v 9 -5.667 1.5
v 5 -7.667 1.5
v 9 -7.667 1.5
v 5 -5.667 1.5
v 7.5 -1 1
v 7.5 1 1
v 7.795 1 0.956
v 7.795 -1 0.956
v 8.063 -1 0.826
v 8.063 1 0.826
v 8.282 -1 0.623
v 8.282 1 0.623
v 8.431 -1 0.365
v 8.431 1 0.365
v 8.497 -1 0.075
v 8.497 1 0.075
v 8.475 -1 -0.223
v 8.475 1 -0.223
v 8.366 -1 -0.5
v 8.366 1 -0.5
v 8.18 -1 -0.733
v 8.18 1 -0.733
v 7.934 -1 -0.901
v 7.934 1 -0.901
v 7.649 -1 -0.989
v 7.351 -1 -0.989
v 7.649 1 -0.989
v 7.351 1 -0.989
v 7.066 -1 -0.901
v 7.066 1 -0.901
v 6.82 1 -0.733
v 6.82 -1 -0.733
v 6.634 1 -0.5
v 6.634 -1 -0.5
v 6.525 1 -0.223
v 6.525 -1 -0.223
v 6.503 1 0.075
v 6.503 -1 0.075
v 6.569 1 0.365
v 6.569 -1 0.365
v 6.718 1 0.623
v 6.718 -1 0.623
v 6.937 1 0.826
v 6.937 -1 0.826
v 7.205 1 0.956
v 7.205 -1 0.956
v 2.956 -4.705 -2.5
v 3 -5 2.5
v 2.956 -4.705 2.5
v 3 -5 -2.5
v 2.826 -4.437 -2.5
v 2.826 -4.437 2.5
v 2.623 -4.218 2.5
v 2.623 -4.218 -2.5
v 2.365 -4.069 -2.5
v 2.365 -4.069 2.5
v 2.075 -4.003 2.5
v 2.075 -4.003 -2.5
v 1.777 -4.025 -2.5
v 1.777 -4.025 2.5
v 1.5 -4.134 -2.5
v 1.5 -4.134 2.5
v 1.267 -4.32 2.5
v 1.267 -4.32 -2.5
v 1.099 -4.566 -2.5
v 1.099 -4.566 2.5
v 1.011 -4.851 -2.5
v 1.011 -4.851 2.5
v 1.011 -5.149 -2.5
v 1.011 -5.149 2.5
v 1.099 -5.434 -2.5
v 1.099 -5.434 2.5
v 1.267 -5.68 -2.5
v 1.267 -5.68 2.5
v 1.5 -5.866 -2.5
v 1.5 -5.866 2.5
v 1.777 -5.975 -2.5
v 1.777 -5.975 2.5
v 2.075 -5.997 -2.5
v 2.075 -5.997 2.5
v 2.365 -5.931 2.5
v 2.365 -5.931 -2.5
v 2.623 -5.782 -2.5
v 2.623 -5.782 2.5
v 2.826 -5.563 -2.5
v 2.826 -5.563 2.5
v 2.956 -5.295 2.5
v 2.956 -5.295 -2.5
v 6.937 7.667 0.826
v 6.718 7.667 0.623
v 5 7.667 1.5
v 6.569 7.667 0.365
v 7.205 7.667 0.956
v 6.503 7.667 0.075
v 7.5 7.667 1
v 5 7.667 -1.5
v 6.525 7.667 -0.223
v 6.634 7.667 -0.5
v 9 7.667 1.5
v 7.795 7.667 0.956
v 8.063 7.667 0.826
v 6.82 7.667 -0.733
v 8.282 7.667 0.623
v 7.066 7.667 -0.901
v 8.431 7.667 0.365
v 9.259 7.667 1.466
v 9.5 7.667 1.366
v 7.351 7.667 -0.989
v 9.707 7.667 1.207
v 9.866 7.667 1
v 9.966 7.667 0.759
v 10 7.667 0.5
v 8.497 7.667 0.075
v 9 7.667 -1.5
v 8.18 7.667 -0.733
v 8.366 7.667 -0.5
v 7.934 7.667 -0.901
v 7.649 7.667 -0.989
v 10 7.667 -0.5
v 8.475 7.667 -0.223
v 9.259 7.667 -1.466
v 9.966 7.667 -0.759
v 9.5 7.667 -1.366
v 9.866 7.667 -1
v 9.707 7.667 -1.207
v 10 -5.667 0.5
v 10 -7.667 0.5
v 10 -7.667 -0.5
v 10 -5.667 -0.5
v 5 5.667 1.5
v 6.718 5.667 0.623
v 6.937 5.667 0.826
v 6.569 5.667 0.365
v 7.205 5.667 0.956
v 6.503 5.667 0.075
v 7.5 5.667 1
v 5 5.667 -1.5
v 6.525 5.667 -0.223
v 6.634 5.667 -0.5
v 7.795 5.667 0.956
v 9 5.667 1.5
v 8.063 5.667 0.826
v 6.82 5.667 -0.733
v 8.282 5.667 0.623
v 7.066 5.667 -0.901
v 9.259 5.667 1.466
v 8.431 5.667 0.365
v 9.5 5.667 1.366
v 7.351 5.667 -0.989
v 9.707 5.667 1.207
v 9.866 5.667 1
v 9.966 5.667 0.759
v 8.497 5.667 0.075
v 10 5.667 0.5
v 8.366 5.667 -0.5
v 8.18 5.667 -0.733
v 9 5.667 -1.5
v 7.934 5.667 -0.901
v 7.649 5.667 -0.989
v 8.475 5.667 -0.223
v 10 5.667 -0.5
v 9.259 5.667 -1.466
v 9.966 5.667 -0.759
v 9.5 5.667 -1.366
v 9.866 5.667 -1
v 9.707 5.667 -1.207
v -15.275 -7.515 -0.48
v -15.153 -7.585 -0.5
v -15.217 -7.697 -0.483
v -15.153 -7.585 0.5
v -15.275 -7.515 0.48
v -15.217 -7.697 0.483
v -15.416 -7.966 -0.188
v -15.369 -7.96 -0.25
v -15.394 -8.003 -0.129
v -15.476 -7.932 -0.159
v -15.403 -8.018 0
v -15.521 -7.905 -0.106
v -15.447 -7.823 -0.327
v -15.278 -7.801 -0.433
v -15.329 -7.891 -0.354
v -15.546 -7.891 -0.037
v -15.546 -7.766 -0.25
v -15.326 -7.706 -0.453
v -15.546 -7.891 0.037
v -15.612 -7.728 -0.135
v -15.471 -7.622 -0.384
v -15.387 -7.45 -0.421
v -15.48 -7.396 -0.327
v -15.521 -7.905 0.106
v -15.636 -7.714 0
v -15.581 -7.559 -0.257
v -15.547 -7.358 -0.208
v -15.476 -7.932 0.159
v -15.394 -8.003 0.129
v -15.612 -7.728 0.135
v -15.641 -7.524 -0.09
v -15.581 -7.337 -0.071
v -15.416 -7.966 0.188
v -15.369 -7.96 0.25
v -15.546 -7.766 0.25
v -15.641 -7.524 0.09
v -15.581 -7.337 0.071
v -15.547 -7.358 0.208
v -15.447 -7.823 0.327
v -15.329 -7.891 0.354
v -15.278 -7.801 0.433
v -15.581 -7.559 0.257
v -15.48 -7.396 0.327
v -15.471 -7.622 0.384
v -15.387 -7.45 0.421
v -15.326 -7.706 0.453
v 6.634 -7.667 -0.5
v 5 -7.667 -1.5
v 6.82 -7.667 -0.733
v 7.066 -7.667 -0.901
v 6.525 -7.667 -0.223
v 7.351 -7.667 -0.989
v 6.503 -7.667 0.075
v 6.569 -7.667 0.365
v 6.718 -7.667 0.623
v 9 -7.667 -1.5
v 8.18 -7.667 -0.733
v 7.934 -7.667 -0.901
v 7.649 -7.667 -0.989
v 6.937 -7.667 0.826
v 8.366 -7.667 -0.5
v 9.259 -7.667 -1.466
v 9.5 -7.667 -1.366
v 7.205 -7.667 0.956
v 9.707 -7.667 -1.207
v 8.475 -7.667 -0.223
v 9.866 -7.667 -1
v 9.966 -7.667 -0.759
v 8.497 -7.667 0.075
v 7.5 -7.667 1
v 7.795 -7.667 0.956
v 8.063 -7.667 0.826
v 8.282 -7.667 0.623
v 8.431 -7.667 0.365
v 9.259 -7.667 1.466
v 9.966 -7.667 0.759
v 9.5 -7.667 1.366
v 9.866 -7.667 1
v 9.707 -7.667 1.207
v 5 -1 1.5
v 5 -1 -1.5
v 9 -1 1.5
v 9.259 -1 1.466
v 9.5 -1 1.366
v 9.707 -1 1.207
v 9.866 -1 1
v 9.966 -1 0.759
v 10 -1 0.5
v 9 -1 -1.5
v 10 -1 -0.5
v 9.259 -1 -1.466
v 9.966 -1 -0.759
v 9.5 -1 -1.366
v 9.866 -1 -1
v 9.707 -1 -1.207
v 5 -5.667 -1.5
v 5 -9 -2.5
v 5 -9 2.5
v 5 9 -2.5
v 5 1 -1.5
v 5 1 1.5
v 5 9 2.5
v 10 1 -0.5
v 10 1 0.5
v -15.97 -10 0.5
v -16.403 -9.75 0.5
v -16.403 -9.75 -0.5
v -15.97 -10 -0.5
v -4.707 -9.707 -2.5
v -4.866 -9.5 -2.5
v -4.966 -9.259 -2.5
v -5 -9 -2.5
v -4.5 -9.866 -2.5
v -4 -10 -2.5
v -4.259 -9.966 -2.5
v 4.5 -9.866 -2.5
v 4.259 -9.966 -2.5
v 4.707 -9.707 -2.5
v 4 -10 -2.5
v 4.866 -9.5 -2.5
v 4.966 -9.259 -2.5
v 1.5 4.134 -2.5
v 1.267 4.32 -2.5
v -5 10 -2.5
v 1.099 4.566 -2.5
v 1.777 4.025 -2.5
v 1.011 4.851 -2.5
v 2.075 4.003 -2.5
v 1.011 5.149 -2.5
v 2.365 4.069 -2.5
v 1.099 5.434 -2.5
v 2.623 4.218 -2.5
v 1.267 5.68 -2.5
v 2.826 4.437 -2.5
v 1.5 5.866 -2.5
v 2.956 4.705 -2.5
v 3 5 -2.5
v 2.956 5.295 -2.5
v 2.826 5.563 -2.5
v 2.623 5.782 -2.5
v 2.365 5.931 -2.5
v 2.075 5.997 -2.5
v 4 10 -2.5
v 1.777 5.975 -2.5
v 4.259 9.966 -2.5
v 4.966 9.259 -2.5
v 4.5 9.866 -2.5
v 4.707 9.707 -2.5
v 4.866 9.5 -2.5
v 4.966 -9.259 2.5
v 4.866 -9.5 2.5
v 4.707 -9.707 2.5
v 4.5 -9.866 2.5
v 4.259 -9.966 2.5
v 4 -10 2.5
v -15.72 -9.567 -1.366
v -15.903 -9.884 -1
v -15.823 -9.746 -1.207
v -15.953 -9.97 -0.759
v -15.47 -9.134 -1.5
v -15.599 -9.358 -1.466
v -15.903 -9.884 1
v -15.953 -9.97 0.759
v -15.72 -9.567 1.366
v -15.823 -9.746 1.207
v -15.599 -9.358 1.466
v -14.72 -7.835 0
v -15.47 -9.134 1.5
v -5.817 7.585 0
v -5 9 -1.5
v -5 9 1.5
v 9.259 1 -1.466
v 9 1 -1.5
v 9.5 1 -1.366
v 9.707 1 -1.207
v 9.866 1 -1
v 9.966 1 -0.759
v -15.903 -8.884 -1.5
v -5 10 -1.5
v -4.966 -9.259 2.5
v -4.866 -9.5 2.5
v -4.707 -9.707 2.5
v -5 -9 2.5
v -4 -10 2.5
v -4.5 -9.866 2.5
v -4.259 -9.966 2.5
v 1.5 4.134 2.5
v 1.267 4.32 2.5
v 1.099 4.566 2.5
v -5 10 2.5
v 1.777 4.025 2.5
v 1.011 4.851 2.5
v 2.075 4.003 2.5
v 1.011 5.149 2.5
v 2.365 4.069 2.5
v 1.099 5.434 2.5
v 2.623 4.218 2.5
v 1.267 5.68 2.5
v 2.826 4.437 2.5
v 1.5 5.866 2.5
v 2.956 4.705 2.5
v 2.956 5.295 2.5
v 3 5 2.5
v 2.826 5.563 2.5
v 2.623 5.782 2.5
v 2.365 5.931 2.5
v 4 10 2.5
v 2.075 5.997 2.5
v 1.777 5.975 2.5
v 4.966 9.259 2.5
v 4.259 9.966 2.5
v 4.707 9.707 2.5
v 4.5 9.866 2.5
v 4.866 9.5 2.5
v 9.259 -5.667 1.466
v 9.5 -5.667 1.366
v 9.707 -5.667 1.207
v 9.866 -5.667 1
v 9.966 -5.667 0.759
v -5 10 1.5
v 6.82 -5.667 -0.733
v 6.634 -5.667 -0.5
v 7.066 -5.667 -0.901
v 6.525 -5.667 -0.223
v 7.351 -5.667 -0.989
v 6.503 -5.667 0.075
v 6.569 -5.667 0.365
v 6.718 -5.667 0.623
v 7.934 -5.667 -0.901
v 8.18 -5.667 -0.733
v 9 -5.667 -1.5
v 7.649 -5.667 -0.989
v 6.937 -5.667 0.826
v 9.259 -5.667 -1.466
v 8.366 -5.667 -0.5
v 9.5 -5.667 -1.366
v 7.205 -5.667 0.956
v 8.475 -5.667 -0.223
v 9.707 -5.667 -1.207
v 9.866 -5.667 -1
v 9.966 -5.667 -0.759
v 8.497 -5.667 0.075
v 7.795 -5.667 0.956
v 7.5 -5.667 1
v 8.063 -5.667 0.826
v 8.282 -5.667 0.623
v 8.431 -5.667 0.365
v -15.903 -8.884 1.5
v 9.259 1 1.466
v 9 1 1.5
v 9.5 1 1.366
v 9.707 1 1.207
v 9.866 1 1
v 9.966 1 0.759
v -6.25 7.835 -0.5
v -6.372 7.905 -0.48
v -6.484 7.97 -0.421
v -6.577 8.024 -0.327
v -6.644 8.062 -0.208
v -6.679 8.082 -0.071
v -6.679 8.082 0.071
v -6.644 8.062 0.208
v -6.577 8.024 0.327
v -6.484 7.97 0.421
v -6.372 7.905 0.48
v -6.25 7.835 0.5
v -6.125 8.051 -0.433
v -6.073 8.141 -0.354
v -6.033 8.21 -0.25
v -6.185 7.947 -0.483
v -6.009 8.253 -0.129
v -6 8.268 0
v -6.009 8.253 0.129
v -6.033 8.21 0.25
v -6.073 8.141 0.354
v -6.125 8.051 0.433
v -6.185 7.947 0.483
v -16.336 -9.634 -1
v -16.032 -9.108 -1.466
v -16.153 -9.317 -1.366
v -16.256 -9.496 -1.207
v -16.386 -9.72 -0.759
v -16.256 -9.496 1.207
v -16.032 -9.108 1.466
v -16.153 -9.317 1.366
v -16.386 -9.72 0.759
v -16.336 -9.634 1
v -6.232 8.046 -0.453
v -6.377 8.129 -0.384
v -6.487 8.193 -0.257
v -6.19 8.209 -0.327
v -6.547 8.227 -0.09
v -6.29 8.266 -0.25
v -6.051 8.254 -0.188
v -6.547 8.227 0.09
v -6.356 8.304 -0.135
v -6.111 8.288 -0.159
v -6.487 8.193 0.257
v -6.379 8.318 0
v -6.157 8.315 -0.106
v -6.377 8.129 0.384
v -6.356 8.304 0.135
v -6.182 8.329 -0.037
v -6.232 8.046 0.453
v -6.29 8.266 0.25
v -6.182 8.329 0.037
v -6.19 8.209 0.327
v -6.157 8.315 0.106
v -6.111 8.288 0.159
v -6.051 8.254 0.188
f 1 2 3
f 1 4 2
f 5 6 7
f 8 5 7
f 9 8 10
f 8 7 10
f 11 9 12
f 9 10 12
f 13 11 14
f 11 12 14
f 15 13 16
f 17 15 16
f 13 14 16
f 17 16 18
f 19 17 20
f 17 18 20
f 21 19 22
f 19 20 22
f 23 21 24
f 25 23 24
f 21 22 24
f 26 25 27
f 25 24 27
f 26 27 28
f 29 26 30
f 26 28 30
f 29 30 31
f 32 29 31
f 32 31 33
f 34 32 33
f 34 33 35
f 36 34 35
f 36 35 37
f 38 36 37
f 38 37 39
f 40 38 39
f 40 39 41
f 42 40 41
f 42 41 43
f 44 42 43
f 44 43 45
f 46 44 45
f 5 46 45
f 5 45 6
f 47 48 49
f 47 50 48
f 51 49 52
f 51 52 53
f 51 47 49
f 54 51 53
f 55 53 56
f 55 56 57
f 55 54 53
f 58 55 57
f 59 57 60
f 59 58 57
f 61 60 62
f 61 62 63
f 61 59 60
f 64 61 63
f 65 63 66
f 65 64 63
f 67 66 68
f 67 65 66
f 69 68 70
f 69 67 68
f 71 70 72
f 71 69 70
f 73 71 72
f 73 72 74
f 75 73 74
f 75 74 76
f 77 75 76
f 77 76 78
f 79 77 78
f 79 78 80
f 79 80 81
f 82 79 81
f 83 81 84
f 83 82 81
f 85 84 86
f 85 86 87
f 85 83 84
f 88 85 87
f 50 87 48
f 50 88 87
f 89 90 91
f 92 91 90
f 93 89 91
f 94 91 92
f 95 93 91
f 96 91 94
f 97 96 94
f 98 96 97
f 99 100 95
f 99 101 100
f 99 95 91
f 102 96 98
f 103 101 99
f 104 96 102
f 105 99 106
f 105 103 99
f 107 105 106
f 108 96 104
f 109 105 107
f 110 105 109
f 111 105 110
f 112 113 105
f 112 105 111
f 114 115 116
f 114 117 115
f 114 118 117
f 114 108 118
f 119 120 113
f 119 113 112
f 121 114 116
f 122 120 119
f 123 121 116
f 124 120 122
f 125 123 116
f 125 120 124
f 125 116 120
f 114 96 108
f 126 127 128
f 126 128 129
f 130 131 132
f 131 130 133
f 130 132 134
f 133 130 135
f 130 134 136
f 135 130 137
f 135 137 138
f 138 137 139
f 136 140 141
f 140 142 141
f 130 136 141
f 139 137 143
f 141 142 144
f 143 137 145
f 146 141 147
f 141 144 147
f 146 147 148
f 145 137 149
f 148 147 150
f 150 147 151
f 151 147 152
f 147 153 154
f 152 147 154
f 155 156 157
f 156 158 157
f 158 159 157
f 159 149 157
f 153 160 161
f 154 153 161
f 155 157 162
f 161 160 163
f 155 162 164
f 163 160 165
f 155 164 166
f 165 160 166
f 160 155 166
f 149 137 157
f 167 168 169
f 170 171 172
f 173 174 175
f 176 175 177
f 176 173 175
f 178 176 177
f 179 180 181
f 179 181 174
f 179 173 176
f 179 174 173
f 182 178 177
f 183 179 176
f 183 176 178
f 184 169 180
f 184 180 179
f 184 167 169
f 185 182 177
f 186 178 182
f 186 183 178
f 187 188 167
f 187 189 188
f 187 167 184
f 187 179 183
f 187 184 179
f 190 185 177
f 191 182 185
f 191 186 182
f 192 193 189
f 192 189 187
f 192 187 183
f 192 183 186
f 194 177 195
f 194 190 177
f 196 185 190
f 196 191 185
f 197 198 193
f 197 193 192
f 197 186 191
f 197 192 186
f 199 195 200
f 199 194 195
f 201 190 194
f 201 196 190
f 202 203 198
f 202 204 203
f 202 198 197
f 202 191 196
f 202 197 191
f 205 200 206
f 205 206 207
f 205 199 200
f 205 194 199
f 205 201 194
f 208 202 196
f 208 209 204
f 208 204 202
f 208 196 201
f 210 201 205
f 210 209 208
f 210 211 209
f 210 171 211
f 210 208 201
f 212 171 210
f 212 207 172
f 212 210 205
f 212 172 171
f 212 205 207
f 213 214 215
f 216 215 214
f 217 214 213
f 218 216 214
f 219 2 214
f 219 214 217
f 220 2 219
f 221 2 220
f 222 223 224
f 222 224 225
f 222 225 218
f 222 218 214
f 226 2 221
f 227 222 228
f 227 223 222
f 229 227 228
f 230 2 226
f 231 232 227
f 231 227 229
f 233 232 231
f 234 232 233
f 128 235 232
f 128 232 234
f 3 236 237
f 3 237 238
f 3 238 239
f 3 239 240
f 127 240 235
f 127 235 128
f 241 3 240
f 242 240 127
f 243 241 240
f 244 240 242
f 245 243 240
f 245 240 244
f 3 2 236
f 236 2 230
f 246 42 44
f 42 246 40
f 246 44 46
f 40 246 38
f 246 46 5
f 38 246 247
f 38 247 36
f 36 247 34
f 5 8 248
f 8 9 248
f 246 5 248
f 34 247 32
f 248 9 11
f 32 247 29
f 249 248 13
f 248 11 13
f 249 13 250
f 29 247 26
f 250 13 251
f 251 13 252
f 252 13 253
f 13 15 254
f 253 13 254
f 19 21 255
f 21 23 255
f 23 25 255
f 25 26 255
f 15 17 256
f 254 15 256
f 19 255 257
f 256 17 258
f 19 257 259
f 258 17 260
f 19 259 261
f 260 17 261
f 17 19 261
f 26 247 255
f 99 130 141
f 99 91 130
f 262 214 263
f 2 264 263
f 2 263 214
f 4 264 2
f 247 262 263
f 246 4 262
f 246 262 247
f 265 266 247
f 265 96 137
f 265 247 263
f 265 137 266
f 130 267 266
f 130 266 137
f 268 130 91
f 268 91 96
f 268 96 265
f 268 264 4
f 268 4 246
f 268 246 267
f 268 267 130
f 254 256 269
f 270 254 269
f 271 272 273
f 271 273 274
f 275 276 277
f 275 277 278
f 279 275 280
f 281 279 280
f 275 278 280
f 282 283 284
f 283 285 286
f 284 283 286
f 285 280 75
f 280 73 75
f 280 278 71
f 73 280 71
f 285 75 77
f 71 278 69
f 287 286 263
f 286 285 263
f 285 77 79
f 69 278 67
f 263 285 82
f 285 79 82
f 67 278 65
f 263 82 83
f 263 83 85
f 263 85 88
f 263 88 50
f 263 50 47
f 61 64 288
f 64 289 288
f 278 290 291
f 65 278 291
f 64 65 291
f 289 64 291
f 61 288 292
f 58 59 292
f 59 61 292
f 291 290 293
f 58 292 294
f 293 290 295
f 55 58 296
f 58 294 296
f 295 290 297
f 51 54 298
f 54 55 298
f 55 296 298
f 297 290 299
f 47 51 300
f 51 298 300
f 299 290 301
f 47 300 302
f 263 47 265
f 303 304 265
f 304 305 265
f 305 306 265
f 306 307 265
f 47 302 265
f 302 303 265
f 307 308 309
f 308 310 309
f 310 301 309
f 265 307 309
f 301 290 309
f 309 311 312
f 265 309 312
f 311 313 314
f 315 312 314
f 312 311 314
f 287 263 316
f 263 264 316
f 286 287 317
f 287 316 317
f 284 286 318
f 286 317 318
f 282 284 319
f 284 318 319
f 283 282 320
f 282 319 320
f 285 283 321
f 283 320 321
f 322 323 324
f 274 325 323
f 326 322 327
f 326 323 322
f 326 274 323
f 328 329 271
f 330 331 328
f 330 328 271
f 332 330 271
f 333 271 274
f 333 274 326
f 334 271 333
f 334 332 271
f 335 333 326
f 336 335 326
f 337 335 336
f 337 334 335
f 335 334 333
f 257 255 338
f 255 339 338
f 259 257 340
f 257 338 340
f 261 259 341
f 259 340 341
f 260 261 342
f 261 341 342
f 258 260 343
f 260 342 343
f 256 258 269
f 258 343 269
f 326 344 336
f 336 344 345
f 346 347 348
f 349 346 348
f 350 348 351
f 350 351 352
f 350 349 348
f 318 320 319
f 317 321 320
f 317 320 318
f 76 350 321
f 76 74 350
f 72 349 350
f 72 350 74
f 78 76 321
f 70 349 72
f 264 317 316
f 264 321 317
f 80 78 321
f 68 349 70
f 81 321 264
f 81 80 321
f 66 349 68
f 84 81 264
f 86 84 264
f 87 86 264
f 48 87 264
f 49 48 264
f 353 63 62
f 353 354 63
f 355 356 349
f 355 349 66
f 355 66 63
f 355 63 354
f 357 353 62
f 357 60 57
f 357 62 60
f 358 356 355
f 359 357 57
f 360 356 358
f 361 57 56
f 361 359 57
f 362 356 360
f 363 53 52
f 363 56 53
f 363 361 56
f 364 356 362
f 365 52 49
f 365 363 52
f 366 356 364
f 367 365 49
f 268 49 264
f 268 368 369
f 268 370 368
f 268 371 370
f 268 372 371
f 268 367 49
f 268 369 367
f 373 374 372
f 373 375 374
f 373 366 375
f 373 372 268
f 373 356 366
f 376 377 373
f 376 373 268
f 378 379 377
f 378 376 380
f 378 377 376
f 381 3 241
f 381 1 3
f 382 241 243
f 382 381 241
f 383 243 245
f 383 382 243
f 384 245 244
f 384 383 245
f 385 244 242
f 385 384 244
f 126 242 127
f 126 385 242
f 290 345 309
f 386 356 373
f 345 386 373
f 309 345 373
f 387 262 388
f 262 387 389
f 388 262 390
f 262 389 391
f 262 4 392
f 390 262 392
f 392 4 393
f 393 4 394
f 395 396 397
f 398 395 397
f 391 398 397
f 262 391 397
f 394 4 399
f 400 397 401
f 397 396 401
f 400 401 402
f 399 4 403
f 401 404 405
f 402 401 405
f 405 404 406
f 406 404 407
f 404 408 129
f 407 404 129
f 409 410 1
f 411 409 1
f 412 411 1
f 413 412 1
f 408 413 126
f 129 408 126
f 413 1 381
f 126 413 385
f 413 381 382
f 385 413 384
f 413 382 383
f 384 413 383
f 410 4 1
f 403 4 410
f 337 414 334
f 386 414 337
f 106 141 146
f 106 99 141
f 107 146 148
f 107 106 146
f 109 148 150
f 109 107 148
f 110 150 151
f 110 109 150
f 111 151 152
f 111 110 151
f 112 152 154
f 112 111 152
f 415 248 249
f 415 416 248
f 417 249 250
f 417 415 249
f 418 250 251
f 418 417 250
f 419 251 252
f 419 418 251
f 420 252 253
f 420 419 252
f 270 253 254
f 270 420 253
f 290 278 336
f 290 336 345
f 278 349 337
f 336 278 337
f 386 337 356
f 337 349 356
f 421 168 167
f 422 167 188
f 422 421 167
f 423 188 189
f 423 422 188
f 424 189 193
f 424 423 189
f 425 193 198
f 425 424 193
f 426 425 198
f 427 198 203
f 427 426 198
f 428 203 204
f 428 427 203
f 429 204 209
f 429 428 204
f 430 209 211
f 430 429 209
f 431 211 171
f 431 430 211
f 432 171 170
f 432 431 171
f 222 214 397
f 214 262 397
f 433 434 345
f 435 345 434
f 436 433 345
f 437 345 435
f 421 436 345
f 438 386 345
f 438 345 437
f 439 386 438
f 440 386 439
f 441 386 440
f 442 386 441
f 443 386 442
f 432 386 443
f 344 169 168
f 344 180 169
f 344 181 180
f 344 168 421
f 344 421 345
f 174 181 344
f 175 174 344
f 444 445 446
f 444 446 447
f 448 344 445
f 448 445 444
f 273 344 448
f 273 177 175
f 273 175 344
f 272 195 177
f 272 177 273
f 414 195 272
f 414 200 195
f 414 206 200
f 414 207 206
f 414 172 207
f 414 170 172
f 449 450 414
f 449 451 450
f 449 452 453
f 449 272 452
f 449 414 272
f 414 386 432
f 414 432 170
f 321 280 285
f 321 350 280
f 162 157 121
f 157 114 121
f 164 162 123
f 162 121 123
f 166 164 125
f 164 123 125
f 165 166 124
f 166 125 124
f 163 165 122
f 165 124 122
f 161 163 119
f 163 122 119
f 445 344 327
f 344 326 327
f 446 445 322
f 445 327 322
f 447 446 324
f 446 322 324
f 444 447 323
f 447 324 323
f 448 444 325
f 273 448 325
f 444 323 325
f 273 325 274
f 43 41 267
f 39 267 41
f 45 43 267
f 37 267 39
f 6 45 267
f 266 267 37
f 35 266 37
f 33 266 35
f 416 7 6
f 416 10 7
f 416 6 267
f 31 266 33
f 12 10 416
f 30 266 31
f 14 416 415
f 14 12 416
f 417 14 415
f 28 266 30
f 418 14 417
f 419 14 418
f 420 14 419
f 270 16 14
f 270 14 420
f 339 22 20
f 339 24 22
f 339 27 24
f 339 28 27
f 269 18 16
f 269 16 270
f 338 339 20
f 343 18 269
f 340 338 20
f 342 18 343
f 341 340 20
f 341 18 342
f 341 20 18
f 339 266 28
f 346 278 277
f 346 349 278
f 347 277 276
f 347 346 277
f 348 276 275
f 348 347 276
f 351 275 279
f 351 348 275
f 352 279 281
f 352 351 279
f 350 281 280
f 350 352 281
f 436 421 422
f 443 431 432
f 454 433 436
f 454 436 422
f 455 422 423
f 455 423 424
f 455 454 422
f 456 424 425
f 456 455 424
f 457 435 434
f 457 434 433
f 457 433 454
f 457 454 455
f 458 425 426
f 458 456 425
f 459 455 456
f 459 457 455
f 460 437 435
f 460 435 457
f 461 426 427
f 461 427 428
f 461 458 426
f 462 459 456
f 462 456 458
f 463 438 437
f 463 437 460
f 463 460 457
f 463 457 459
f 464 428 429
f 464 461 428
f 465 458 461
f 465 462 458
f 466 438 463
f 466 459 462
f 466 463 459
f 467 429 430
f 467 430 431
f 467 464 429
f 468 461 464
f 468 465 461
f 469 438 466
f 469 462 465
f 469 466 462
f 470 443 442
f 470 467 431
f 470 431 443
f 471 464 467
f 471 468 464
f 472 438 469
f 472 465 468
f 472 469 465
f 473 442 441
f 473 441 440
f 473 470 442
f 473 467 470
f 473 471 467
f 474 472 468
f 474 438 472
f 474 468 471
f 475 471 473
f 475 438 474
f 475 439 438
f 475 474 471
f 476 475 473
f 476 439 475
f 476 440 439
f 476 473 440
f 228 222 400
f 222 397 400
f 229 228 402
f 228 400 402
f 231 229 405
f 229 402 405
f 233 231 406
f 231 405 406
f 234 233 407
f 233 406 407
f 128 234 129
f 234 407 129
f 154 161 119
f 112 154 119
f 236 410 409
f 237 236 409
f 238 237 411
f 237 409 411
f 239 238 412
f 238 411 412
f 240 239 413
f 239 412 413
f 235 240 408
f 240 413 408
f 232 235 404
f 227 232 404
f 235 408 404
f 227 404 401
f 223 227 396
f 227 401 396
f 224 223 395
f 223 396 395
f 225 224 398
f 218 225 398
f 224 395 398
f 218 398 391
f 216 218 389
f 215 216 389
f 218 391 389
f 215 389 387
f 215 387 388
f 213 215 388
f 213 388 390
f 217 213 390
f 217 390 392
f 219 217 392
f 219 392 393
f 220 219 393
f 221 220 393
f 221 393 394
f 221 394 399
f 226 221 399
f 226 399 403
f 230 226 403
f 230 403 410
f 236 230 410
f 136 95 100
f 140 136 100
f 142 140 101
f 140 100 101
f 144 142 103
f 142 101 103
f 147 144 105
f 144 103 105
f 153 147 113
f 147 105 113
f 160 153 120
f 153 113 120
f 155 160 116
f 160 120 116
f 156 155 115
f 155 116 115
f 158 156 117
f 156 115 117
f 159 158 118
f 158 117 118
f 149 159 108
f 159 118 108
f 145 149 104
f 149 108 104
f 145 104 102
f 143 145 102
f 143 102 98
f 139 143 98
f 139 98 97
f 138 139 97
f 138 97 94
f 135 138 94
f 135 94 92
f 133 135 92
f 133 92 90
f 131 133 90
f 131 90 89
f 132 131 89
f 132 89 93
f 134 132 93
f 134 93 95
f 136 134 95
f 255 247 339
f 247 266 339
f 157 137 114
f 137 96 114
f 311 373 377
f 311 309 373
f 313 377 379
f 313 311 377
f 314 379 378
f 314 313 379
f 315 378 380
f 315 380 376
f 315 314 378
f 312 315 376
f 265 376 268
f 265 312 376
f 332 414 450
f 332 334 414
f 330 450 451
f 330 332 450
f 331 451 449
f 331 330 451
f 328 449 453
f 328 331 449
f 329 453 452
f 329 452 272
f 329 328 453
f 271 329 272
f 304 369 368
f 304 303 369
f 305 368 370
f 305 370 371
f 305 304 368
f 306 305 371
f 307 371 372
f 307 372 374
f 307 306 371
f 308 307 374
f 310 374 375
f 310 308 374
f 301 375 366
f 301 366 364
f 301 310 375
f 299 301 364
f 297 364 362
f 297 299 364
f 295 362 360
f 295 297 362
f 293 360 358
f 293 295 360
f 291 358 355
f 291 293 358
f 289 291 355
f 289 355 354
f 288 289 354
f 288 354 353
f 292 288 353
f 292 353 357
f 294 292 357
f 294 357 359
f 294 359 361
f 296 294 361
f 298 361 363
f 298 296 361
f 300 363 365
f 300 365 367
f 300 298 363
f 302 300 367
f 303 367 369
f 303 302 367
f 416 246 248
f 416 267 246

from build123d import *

# Parameters (mm, degrees)
ESQUISSE1_W             = 10
ESQUISSE1_H             = 20
ESQUISSE1_R             = 1
BOSS_EXTRU_1_DEPTH      = 2.5
ESQUISSE1_3_W           = 5
ESQUISSE1_3_H           = 2
BOSS_EXTRU_2_DEPTH      = 1.5
BOSS_EXTRU_3_DEPTH      = 1.5
ENL_V_MAT_EXTRU_1_REACH = 26.237
ESQUISSE3_R             = 1
CONG_1_R                = 1
CONG_2_R                = 1


# Read off the part's stored shape, not the designer's step: Révolution1
with BuildPart() as part:
    # Esquisse1 → Boss.-Extru.1 (new, symmetric)
    with BuildSketch(Plane.XY):
        Rectangle(ESQUISSE1_W, ESQUISSE1_H)
        with Locations((2, -5)):
            Circle(ESQUISSE1_R, mode=Mode.SUBTRACT)
        with Locations((2, 5)):
            Circle(ESQUISSE1_R, mode=Mode.SUBTRACT)
    extrude(amount=BOSS_EXTRU_1_DEPTH, both=True)

    # Esquisse1<3> → Boss.-Extru.2 (add, symmetric)
    with BuildSketch(Plane.XY):
        with Locations((7.5, 6.666666667)):
            Rectangle(ESQUISSE1_3_W, ESQUISSE1_3_H)
        with Locations((7.5, 0)):
            Rectangle(ESQUISSE1_3_W, ESQUISSE1_3_H)
        with Locations((7.5, -6.666666667)):
            Rectangle(ESQUISSE1_3_W, ESQUISSE1_3_H)
    extrude(amount=BOSS_EXTRU_2_DEPTH, both=True)

    # Esquisse1<5> → Boss.-Extru.3 (add, symmetric)
    with BuildSketch(Plane.XY):
        Polygon((-5, 9), (-5, 10), (-16.402667816, -9.75), (-15.969655115, -10), align=None)
    extrude(amount=BOSS_EXTRU_3_DEPTH, both=True)

    # Révolution1 outline → Révolution1 (revolve)
    with BuildSketch(Plane(origin=(-8.080127019, 4.665063509, 0), x_dir=(0.8660254037844386, -0.4999999999999999, 0), z_dir=(0, 0, 1))):
        with BuildLine():
            Line((0.5, -14.145081595), (0.5, 3.660254038))
            ThreePointArc((0.5, 3.660254038), (0.35355339, 4.013807428), (0, 4.160254038))
            Line((0, 4.160254038), (0, -14.645081595))
            ThreePointArc((0, -14.645081595), (0.353553391, -14.498634986), (0.5, -14.145081595))
        make_face()
    revolve(axis=Axis((-8.080127019, 4.665063509, 0), (0.4999999999999999, 0.8660254037844386, 0)))

    # Enlèv. mat.-Extru.1: up to this face of the body (flat: up to its plane)
    enl_v_mat_extru_1_end = Plane(part.part.faces().sort_by_distance((7.5, -7.666666667, 0))[0])
    # Esquisse3 → Enlèv. mat.-Extru.1 (cut, up to the picked face)
    with BuildSketch(Plane(origin=(0, 7.666666667, 0), x_dir=(1, 0, 0), z_dir=(0, 1, 0)), mode=Mode.PRIVATE) as enl_v_mat_extru_1_sk1:
        with Locations(Location((7.5, 0, 0), (0, 0, 270))):
            Circle(ESQUISSE3_R)
    enl_v_mat_extru_1_tool1 = split(extrude(enl_v_mat_extru_1_sk1.sketch, amount=-ENL_V_MAT_EXTRU_1_REACH, mode=Mode.PRIVATE), bisect_by=enl_v_mat_extru_1_end, keep=Keep.BOTH, mode=Mode.PRIVATE)
    add(enl_v_mat_extru_1_tool1.solids().sort_by(Axis((7.5, 7.666667, 0), (0, -1, 0)))[0], mode=Mode.SUBTRACT)

    # Congé1
    cong_1_edges = [part.edges().sort_by_distance(p)[0] for p in [
        (5, -10, 0),
        (-5, -10, 0),
        (5, 10, 0),
        (-16.186161466, -9.875, -1.5),
        (-16.186161466, -9.875, 1.5),
    ]]
    fillet(cong_1_edges, radius=CONG_1_R)

    # Congé2
    cong_2_edges = [part.edges().sort_by_distance(p)[0] for p in [
        (10, 6.666666667, 1.5),
        (10, 6.666666667, -1.5),
        (10, 0, 1.5),
        (10, 0, -1.5),
        (10, -6.666666667, -1.5),
        (10, -6.666666667, 1.5),
    ]]
    fillet(cong_2_edges, radius=CONG_2_R)


solid = part.part
